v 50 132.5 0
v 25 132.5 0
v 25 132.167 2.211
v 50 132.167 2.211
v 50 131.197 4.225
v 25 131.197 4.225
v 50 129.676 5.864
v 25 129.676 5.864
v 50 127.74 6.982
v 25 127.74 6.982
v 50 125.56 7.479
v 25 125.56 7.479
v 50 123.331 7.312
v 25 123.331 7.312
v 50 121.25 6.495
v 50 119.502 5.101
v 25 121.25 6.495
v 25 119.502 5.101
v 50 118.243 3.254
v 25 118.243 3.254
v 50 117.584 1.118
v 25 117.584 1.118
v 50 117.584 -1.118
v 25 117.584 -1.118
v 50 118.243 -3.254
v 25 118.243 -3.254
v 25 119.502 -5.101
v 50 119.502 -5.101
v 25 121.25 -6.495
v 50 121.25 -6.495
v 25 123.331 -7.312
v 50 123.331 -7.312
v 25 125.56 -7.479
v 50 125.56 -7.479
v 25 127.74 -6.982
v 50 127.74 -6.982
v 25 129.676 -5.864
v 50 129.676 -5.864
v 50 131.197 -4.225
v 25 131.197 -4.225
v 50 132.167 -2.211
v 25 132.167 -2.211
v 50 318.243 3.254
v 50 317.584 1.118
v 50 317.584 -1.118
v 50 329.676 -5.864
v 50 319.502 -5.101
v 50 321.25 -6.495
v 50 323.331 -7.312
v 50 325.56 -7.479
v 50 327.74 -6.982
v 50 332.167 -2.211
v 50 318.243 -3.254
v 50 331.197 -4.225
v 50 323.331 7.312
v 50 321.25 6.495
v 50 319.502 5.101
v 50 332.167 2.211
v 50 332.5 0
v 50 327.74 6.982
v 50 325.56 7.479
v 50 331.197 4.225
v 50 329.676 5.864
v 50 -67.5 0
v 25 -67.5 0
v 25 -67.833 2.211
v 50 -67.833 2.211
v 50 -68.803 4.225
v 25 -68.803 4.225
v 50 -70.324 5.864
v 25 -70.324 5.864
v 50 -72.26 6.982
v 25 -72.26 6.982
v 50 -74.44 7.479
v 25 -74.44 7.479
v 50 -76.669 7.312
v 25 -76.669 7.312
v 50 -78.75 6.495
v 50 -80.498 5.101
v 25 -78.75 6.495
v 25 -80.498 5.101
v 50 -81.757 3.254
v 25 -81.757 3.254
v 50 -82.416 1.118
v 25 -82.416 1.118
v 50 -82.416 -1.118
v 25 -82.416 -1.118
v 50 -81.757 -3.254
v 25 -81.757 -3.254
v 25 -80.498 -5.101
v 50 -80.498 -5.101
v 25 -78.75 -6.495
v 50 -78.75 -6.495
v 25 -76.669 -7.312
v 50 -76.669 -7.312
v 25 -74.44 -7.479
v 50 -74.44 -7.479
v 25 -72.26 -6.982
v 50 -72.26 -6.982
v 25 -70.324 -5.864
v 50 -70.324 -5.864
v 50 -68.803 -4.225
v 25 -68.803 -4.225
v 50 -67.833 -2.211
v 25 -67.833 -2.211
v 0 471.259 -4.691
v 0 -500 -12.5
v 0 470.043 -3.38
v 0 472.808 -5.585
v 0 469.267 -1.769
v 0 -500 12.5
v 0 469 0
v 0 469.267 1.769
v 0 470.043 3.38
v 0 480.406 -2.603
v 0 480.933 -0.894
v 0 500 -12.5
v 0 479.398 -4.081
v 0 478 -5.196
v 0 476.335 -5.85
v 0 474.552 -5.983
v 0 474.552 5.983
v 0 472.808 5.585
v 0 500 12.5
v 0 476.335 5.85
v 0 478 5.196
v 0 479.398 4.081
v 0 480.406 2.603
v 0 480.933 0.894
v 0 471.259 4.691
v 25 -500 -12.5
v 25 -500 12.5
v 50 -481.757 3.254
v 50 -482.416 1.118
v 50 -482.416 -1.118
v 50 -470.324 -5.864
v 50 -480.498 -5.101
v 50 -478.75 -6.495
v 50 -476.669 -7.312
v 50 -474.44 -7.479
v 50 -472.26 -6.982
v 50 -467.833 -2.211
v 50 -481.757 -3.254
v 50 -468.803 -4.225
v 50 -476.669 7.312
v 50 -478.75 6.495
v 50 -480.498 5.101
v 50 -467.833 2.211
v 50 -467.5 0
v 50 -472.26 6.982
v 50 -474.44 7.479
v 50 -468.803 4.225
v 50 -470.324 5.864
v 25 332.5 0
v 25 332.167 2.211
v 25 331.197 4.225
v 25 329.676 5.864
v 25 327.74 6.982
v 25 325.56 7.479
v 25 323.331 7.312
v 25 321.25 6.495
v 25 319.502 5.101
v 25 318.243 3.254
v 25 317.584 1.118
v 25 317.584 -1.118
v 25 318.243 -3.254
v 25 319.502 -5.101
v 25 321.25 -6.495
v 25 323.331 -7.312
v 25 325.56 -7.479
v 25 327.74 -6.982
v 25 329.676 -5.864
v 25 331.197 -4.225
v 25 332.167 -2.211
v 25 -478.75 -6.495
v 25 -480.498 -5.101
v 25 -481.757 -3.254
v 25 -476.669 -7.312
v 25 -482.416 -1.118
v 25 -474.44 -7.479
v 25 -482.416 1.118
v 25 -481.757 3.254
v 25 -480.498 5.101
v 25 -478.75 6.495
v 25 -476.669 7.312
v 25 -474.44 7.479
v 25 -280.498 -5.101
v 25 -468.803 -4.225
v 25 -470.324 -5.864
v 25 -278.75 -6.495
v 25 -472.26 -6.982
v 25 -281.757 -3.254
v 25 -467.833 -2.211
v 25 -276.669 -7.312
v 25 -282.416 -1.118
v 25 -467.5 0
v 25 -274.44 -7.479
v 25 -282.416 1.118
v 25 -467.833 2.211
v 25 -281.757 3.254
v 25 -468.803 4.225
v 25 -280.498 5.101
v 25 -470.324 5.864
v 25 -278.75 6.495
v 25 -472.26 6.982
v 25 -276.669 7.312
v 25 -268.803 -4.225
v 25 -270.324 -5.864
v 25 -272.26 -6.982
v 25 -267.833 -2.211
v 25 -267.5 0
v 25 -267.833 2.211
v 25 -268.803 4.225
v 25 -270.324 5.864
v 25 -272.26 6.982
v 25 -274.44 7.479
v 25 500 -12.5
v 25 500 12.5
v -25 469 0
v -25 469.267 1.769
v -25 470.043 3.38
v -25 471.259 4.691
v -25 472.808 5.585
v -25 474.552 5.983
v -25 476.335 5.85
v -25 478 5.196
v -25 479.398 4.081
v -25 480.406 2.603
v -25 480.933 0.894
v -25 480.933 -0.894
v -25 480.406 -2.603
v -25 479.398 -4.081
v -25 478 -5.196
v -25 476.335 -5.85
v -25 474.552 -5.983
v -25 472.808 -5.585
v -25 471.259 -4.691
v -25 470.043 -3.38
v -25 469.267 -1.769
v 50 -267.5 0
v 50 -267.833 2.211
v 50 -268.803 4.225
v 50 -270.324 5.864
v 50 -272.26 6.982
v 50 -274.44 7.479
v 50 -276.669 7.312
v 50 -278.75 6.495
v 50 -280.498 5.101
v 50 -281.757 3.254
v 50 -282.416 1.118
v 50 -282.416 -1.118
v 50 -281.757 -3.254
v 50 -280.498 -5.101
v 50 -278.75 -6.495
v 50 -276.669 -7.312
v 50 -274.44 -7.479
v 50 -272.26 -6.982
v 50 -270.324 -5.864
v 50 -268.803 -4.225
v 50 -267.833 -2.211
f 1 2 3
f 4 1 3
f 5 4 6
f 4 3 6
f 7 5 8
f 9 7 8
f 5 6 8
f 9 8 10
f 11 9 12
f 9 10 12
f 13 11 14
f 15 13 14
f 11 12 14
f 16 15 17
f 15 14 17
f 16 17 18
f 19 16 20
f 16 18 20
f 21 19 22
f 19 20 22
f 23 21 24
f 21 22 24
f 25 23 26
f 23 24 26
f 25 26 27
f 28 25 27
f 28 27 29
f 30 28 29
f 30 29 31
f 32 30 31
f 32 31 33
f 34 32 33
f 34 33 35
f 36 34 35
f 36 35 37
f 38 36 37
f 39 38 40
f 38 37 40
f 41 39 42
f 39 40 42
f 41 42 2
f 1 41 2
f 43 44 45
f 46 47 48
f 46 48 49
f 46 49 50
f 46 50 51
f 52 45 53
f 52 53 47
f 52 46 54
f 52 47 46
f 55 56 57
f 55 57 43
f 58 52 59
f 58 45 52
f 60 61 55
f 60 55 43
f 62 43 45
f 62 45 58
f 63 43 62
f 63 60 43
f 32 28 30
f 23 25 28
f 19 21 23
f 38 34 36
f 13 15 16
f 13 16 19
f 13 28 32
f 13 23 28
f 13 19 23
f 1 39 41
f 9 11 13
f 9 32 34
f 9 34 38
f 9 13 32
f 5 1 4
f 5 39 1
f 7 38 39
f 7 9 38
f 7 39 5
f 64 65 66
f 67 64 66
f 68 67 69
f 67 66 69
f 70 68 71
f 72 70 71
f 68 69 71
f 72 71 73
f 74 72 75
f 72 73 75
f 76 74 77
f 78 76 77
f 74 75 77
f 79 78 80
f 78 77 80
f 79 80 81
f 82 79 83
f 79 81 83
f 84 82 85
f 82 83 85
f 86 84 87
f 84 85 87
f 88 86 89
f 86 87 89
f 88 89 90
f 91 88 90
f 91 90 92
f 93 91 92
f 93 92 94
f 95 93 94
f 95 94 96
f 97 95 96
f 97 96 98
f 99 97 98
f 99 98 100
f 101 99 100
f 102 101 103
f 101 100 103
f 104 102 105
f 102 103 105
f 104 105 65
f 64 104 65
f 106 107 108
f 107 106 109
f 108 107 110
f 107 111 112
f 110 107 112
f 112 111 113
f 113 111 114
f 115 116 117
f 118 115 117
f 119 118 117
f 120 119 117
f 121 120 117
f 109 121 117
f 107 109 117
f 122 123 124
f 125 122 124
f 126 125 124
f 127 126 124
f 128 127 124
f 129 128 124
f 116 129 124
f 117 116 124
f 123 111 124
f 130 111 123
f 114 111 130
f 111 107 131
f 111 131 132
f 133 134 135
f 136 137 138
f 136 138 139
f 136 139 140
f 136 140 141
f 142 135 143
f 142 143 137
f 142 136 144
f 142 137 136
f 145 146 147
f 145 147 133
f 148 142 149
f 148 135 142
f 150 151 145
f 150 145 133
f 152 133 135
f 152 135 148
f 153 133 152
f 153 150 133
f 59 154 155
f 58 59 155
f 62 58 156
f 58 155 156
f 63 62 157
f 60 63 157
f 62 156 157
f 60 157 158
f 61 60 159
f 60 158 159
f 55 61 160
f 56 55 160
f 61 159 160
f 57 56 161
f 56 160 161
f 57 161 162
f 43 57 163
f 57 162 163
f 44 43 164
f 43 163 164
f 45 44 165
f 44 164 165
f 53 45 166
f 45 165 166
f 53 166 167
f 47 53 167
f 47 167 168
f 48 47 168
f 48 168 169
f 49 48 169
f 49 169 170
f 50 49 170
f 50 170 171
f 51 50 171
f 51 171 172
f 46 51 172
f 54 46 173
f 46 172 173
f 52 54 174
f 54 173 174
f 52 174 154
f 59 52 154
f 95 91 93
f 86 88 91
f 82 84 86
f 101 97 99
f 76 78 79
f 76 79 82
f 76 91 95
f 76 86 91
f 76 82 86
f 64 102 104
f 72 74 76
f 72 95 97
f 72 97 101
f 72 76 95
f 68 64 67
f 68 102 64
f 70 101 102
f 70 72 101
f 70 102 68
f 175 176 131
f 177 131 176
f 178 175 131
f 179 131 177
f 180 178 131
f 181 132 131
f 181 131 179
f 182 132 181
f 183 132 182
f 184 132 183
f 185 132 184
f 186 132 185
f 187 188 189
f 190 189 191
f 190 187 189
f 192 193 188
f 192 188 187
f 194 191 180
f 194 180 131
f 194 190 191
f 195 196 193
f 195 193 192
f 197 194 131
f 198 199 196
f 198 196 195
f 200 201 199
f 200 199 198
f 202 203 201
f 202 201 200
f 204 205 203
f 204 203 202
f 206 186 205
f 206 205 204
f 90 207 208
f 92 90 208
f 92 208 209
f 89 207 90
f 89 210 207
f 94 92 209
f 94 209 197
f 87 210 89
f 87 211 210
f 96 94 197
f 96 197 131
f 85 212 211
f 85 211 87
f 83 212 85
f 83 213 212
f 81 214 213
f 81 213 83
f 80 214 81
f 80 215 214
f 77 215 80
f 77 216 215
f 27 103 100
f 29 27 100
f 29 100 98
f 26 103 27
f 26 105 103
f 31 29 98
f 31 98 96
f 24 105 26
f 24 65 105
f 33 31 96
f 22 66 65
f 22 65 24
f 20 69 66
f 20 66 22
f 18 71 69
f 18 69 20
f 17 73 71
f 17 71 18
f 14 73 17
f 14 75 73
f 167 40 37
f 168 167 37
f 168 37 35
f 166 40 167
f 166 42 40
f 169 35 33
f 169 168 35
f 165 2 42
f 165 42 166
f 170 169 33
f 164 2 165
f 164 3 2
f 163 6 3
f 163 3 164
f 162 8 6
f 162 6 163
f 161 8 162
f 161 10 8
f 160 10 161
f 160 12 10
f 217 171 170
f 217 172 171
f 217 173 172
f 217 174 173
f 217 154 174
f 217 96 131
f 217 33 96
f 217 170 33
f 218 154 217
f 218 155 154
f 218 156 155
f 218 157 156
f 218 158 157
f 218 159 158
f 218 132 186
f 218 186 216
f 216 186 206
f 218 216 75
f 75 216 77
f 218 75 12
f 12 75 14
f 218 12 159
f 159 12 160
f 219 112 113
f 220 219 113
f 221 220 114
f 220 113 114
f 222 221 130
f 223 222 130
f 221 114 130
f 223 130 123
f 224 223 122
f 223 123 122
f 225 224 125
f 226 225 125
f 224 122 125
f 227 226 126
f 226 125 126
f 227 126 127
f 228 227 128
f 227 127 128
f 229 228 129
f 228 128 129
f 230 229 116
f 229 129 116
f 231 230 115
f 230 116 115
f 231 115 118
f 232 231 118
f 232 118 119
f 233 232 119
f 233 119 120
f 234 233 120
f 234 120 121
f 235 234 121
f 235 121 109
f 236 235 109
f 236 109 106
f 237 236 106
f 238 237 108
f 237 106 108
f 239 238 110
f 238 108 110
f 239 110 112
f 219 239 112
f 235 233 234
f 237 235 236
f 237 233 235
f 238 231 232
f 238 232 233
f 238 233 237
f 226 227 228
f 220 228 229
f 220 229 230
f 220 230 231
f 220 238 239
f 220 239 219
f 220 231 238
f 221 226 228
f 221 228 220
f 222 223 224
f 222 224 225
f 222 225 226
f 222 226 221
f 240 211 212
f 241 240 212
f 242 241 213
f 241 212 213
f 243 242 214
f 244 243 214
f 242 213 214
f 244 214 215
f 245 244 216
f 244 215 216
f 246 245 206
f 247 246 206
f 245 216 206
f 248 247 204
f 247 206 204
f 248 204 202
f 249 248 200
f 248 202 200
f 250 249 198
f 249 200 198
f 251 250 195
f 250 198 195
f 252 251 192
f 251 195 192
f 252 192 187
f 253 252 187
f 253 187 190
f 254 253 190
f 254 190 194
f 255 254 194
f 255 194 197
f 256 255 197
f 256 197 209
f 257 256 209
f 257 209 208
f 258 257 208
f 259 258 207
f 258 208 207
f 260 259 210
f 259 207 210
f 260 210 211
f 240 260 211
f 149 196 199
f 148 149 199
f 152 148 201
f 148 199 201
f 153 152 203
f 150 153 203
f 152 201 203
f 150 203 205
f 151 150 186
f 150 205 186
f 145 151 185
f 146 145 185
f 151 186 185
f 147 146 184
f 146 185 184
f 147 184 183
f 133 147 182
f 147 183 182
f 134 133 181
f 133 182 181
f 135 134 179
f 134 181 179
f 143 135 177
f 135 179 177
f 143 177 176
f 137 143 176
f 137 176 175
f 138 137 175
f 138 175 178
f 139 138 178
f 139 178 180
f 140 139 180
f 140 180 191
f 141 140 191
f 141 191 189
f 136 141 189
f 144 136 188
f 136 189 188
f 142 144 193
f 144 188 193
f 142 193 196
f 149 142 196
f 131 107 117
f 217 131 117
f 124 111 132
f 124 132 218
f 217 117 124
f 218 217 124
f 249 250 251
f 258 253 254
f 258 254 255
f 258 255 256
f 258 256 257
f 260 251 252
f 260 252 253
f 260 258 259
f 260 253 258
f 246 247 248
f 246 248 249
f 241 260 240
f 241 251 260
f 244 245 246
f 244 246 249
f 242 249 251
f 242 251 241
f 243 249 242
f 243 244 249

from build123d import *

# Parameters (mm, degrees)
F0_W     = 1000
F0_H     = 25
F1_DEPTH = 25
F2_R     = 7.5
F3_DEPTH = 25
F4_R     = 6
F5_DEPTH = 25


with BuildPart() as f1:
    # F0 (on Right) → F1 (new body)
    with BuildSketch(Plane.YZ):
        Rectangle(F0_W, F0_H)
    extrude(amount=F1_DEPTH)

    # F2 (on face) → F3 (join)
    with BuildSketch(Plane.YZ.offset(25)):
        with Locations((-475, 0)):
            Circle(F2_R)
        with Locations((-275, 0)):
            Circle(F2_R)
        with Locations((-75, 0)):
            Circle(F2_R)
        with Locations((125, 0)):
            Circle(F2_R)
        with Locations((325, 0)):
            Circle(F2_R)
    extrude(amount=F3_DEPTH)

    # F4 (on face) → F5 (join)
    with BuildSketch(Plane(origin=(0, 0, 0), x_dir=(0, -1, 0), z_dir=(-1, 0, 0))):
        with Locations((-475, 0)):
            Circle(F4_R)
    extrude(amount=F5_DEPTH)


solid = f1.part
